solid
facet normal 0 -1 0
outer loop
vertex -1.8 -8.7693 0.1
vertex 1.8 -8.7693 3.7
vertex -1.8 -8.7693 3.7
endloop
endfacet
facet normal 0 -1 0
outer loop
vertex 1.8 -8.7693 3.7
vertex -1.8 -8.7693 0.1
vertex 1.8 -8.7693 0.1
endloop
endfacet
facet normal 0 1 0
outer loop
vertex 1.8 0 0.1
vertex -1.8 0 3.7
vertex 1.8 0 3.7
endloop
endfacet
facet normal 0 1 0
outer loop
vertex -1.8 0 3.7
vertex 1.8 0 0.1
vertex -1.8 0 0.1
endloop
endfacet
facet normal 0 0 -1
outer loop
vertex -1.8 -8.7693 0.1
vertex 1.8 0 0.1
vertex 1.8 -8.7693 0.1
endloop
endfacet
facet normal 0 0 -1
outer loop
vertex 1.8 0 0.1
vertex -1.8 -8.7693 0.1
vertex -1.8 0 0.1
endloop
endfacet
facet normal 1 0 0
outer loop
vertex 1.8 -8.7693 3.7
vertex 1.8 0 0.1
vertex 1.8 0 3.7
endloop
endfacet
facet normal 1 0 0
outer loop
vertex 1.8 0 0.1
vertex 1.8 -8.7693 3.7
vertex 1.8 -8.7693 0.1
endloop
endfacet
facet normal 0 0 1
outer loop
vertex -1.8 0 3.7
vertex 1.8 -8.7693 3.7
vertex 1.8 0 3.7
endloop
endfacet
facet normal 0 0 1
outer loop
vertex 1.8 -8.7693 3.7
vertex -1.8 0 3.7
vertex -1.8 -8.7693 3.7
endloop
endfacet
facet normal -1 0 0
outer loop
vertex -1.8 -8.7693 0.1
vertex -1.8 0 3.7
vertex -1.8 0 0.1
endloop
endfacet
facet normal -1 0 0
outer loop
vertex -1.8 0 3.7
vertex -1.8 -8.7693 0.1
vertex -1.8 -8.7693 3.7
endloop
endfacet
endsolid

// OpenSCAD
////////////////////////////////////////////////////////////////////////////////
//
// FingerBoard.scad
//
// Contains OpenScad code for the fingerboard/neck for the guitar chord chart
// project.
//
// Copyright (C) 2015-2016 Joseph M. Corbett
//
// This program is free software: you can redistribute it and/or modify it under
// the terms of the GNU General Public License as published by the Free Software
// Foundation, either version 3 of the License, or (at your option) any later
// version.
//
// This program is distributed in the hope that it will be useful, but
// WITHOUT ANY WARRANTY; without even the implied warranty of MERCHANTABILITY or
// FITNESS FOR A PARTICULAR PURPOSE. See the GNU General Public License for more
// details.
//
// You should have received a copy of the GNU General Public License along with
// this program. If not, see <http://www.gnu.org/licenses>.
//
////////////////////////////////////////////////////////////////////////////////

include <ChordChartParameters.scad>     // For part parameters.

// Local constants
HoleTolerance           = 0.2;                  // Amount to enlarge holes.
PrinterTolerance        = 0.2;                  // Amount to enlarge hole diameters
                                                //    due to printing tolerance.
MatingOffset            = [4, 0, 0];            // Offset from fret to mating blocks.

// A single fret.
module fret(tolerance = 0)
{
    base = 1.5 + tolerance;
    riserWidth = 0.75 + tolerance;
    riserHeight = 2 + tolerance;
    // The rounded top part of the fret
	cube([base, FBWidth + 2 * tolerance, base], center = true);
    // The squared off lower part of the fret.
    translate([0, 0, riserHeight / 2]) 
        cube([riserWidth, FBWidth + 2 * tolerance, riserHeight], center = true);
    translate([0, -(FBWidth + 2 * tolerance) / 2, riserHeight]) rotate (X * -90)
        cylinder(d = riserWidth, h = FBWidth + 2 * tolerance);


    // // The rounded top part of the fret
	// rotate(X * -90) cylinder(r = FretHeight, h = FBWidth + 2 * tolerance);
    // // The squared off lower part of the fret.
    // translate([-FretHeight, 0, -FretHeight]) 
        // cube([FretHeight * 2, FBWidth + 2 * tolerance, FretHeight]);
}

// All frets.
module frets(tolerance = 0)
{
	for (i = [1:len(FretOffsets) - 1])
	{
		translate([FretOffsets[i], (FBWidth + tolerance) / 2, FBThickness - 1.5]) fret(tolerance);
	}
}

// A single LED hole.
module LedHoles()
{
    if (UseLedHoles)
    {
        for (i = [1:len(FretOffsets) - 1], j = [1:NumStrings])
        {
            // Add a hole for the dome of the LED.
            translate([FretOffsets[i - 1] + (FretOffsets[i] - FretOffsets[i - 1]) / 2,
                      j * (FBWidth / (NumStrings + 1)),
                      -1])
                cylinder(d = LedDiameter + HoleTolerance, h = FBThickness + 2);
            // Add space for the ring at the base of the LED.
            translate([FretOffsets[i - 1] + (FretOffsets[i] - FretOffsets[i - 1]) / 2,
                       j * (FBWidth / (NumStrings + 1)),
                      0]) 
                cylinder(d = LedDiameter + 2 + HoleTolerance, 
                         h = FBThickness - LedHeight + 1);
        }
    }
}

// A mating post.
module MatingPost(tolerance = 0)
{
    side = MatingPinDiameter - tolerance;
    translate([-side / 2, -side / 2, 0])
    cube([side, side , FBMatingHoleDepth + NeckBackMatingHoleDepth - 6]);
}

// All the mating posts.
module MatingPosts()
{
    for(i = FretOffsets)
    {
        // Add a mating post to both sides of the neck at each of the frets.
        translate([i + MatingSupportWidth / 2, 
                   NeckBackThickness + MatingSupportWidth / 2, 
                   -NeckBackMatingHoleDepth - PrinterTolerance] + MatingOffset)
            MatingPost();
        translate([i + MatingSupportWidth / 2, 
                   FBWidth - NeckBackThickness - MatingSupportWidth / 2,
                   -NeckBackMatingHoleDepth - PrinterTolerance] + MatingOffset)
            MatingPost();
    }
}

// The rounded back of the neck.
module NeckBack()
{
	Depth           = FBWidth * NeckZScale / 2;
    TestCubeLength  = 100;
    SphereXScale    = 1.5;
	ExtensionLength = 68;
    
	difference()
	{
        // Create the outer part of the cylinder shell.
		translate([0, FBWidth/2, 0]) rotate(Y * 90) 
            scale([NeckZScale, 1, 1]) cylinder(d = FBWidth, h = NeckLength);
        // Remove the inner part of the cylinder shell.
		translate([-1, FBWidth / 2, 0]) rotate(Y * 90) scale([NeckZScale, 1, 1])
            cylinder(d = FBWidth - (NeckBackThickness * 2), h = NeckLength + 2);
        // Remove the top half of the cylinder.
		translate([-1, -1, 0]) 
            cube([NeckLength + 2, FBWidth + 2, FBWidth * NeckZScale / 2 + 1]);
        // Clip off the small piece that was left due to the headstock merge.
        if (UseStraightNeck == 0)
        {
            // Limit the sphere shell to where it meets the headstock.
            translate([-TestCubeLength * cos(HeadstockYAngle) + 1,
                       -0.1,
                       -TestCubeLength * sin(HeadstockYAngle)])
                rotate([0, -HeadstockYAngle + 0.1, 0])
                cube([TestCubeLength + 10, FBWidth + 0.2, HeadThickness * 2]);
        }
        // Hole for the retainer pin.
        translate([NeckLength - NeckSupportPinHeight, FBWidth / 2, -20]) 
            cylinder(r = NeckSupportPinRadius + 0.1, h = 10);
	}
	difference()
	{
        // Add the mating supports.
		for (i = [0:len(FretOffsets) - 1])
		{
			translate([FretOffsets[i], NeckBackThickness, -Depth] + MatingOffset) 
                cube([MatingSupportWidth, MatingSupportWidth, Depth]);
			translate([FretOffsets[i], FBWidth - NeckBackThickness - MatingSupportWidth,
                      -Depth] + MatingOffset)
                cube([MatingSupportWidth, MatingSupportWidth, Depth]);
		}
        // Lop off the mating supports outside the neck back shell.
		difference()
		{
			translate([-1, FBWidth / 2, 0]) rotate(Y * 90) 
                scale([NeckZScale, 1, 1]) 
                cylinder(d = FBWidth * 2, h = NeckLength + 2);
			translate([0, FBWidth / 2, 0]) rotate(Y * 90) 
                scale([NeckZScale, 1, 1])
                cylinder(d = FBWidth, h = NeckLength);
			translate([-1, -FBWidth / 2, 0]) 
                cube([NeckLength + 2, 
                      FBWidth * 2 + 2,
                      FBWidth * NeckZScale / 2 + 1]);
        }
        // Bore out the holes for the mating connectors.
        for (i = [0:len(FretOffsets) - 1])
        {
            translate([FretOffsets[i] + MatingSupportWidth / 2, 
                       NeckBackThickness + MatingSupportWidth / 2,
                      -NeckBackMatingHoleDepth / 2 - 2] + MatingOffset)
                      MatingPost();
            translate([FretOffsets[i] + MatingSupportWidth / 2,
                       FBWidth - NeckBackThickness-MatingSupportWidth / 2,
                       -NeckBackMatingHoleDepth / 2 - 2] + MatingOffset)
                      MatingPost();
        }
	}
    if(UseStraightNeck)
    {
        // Straight neck merge to the headstock is selected.
        difference()
        {
            // Extend the neck back shell toward the headstock.
            translate([-ExtensionLength, FBWidth / 2, 0]) rotate([0, 90, 0])
                scale([NeckZScale, 1, 1])
                cylinder(d = FBWidth, h = ExtensionLength + 1);
            translate([-ExtensionLength- 0.1, FBWidth / 2, 0])
                rotate([0, 90, 0]) scale([NeckZScale, 1, 1])
                cylinder(d = FBWidth - (NeckBackThickness * 2), h = ExtensionLength + 1.2);
            // Remove the top of the extension cylinders.
            translate([-ExtensionLength - 0.1, -1, 0])
                cube([100 + 2, FBWidth + 2, FBWidth * NeckZScale / 2 + 1]);  
            // Limit the shell to where it meets the headstock.
            translate([-TestCubeLength * cos(HeadstockYAngle),
                       -.01,
                       -TestCubeLength * sin(HeadstockYAngle)])
                rotate([0, -HeadstockYAngle, 0]) 
                cube([TestCubeLength, FBWidth + 0.2, HeadThickness * 2]);
        }
    }
    else
    {
        // Spherical neck merge to the headstock is selected.
        difference()
        {
            // Create a scaled sphere to extend the neck back toward the headstock.
            translate([1, FBWidth / 2, 0]) 
                scale([SphereXScale, 1, NeckZScale]) 
                sphere(d = FBWidth);
            // Truncate the sphere at the point of intersection with the neck back.
            translate([1, FBWidth / 2, 0]) rotate(Y * 90) 
                scale([NeckZScale, 1, 1]) 
                cylinder(d = FBWidth - (NeckBackThickness * 2), h = FBWidth + 1);
            // Limit the sphere to be a shell with the same thickness as the neck back.
            translate([1, FBWidth / 2, 0])
                scale([SphereXScale, 1, NeckZScale])
                sphere(d = FBWidth - (NeckBackThickness * 2));
            // Cut off the top of the sphere shell.
            translate([-ExtensionLength - 0.1, -1, 0])
                cube([100 + 2, FBWidth + 2, FBWidth * NeckZScale / 2 + 1]); 
            // Limit the sphere shell to where it meets the headstock.
            translate([-TestCubeLength * cos(HeadstockYAngle) + 1,
                       -0.1,
                       -TestCubeLength * sin(HeadstockYAngle)])
                rotate([0, -HeadstockYAngle + 0.1, 0])
                cube([TestCubeLength + 10, FBWidth + 0.2, HeadThickness * 2]);
        }
    }
}

// Holes in the bottom of the fingerboard used for mating the fingerboard to the back of the neck.
module MatingHoles(depth = 1)
{
	for (i = [0:len(FretOffsets) - 1])
	{
		translate([FretOffsets[i] + MatingSupportWidth / 2, 
                   NeckBackThickness + MatingSupportWidth / 2, 
                   -0.2] + MatingOffset)
                   MatingPost();
		translate([FretOffsets[i] + MatingSupportWidth / 2,
                   FBWidth - NeckBackThickness - MatingSupportWidth / 2,
                   -0.2] + MatingOffset)
                   MatingPost();
	}	
}

// A single decorative inlay in the top of the fingerboard.
module TopInlay(FretIndex, tolerance = 0)
{
    if (UseTopInlays)
    {
        margin = 3;
        base   = FretOffsets[FretIndex - 1];
        height = FretOffsets[FretIndex] - base - 2 * margin;
        width  = FBWidth - 2 * margin;

        difference()
        {
            // Start the inlay with a square centered within the fret box.
            translate([base + margin + 0.1, margin, FBThickness - 1.9])
                cube([height + tolerance, width + tolerance, 2]);
            if (UseTriangularTopInlays)
            {
                // Turn the inlay into a triangle by removing half of the square diagonally.
                translate([base + margin + 0.1, margin, FBThickness - 2])
                    rotate([0, 0, atan2(width, height)-10])
                    cube([height * 5, width * 5, 2.2]);
            }
            // Cut the LID holes into the inlays.
            if (UseLedHoles)
            {
                for (i = [1:NumStrings])
                {
                    translate([base + height / 2 + margin,
                               i * (FBWidth / (NumStrings + 1)),
                               FBThickness - 2])
                        cylinder(d = LedDiameter + HoleTolerance, h = 3);
                }
            }
        }
    }
}

// A single decorative inlay in the side of the fingerboard.
module SideInlay(FretIndex, tolerance = 0)
{
    if (UseSideInlays)
    {
        margin      = 2;
        inlayHeight = FBThickness - 2 * margin;
        inlayWidth  = inlayHeight;
        baseX       = (FretOffsets[FretIndex] + FretOffsets[FretIndex - 1] - inlayWidth) / 2;
        baseZ       = margin;

        if (UseSquareSideInlays)
        {
            // Side inlays should be square.
            translate([baseX, -0.1, baseZ]) 
                cube([inlayWidth + tolerance, 2, inlayHeight + tolerance]);
        }
        else
        {
            // Side inlays should be circular.
            translate([baseX + (inlayWidth + tolerance) / 2, 1.9, baseZ + (inlayWidth + tolerance) / 2]) 
                rotate([90, 0, 0])
                cylinder(d = inlayWidth + tolerance, h = 2);
        }
    }
}

// The fingerboard itself containing frets, LED holes, and inlays.
module FingerBoard()
{
    difference()
    {
        // Start with the basic fingerboard shape.
        cube([NeckLength, FBWidth, FBThickness]);
        // Add the fret slots.
        frets(.3);
        // Add the LED holes.
        LedHoles();
        // Add the mounting holes.
        translate([0, 0, -3])
            MatingHoles(FBMatingHoleDepth + HoleTolerance);
        // Add the inlay insets.
        for(i = InlayFrets)
        {
            TopInlay(i, HoleTolerance);
            SideInlay(i, HoleTolerance);
        }
        // Cut out space for the nut.
        translate([-PrinterTolerance, -1, 2]) 
            cube([NutWidth + PrinterTolerance, FBWidth + 2, NutHeight]);
        // Add the mounting holes for the nut.
        translate([-PrinterTolerance, 0, 2]) Nut(HoleTolerance);
    }
}

// Fingerboard inlays on specific frets only.
module TopInlays()
{
    for(i=InlayFrets)
    {
        TopInlay(i, 0);
    }
}

// Fingerboard side inlays on specific frets only.
module SideInlays()
{
    for(i = InlayFrets)
    {
        SideInlay(i, 0);
    }
}


// color(FBColor) FingerBoard();

// color(NeckBackColor) translate(-1 * ExplodeZOffset * Explode) NeckBack();
// color(InlayColor)    translate(ExplodeZOffset*Explode) TopInlays();
// color(InlayColor)    translate(-1 * ExplodeYOffset * Explode) SideInlays();
// color(FretColor)     translate(ExplodeZOffset * Explode) frets(0);
// color(NutColor)      translate([0, 0, 2] + ExplodeZOffset * Explode) Nut(0);
// color(NeckBackColor) translate(-0.4 * ExplodeZOffset * Explode) MatingPosts();

//==============================================================================
// The following modules are used for making test prints of various portions
// of the finger board.
//==============================================================================

// Test the lower part of the fingerboard that goes into the base's neck mount.
module TestFbBase()
{
    length = FretOffsets[FretOffsetSize - 1] -
             FretOffsets[FretOffsetSize - 2] + NeckExtension + 4;
    translate([FBWidth / 2, -FretOffsets[FretOffsetSize - 1], 0]) rotate([0, 0, 90])
        intersection()
        {
            FingerBoard();
            translate([FretOffsets[FretOffsetSize - 2] - 2, 0, 0])
                cube([length, FBWidth + 2, FBThickness + 2]);
        }
}

// Test the lower part of the neck that goes into the base's neck mount.
module TestNeckBackBase()
{
    length = FretOffsets[FretOffsetSize - 1] -
             FretOffsets[FretOffsetSize - 2] + NeckExtension + 4;
    translate([-FBWidth / 2, -FretOffsets[FretOffsetSize - 1], 0]) rotate([180, 0, 90])
        intersection()
        {
            NeckBack();
            translate([FretOffsets[FretOffsetSize - 2] - 2, 0, -25])
                cube([length, FBWidth + 2, 30]);
        }
}

// Test the upper part of the fingerboard that connects to the head.
module TestFbTop()
{
    length = FretOffsets[1] + 15;
    translate([FBWidth / 2, -FretOffsets[1] / 2, 0]) rotate([0, 0, 90])
        intersection()
        {
            FingerBoard();
            translate([-1, 0, 0])
                cube([length, FBWidth + 2, FBThickness + 2]);
        }
}

// Test the upper part of the neck that connects to the head.
module TestNeckBackTop()
{
    length = FretOffsets[1] + 55;
    translate([-FBWidth / 2, -FretOffsets[1] / 2, 0]) rotate([180, 0, 90])
        intersection()
        {
            NeckBack();
            translate([-FretOffsets[1], 0, -25])
                cube([length, FBWidth + 2, 30]);
        }
}

// Print a specified top inlay oriented for printing.
module PrintTopInlay(fretIndex = 0, tol = 0)
{
    translate([-FretOffsets[InlayFrets[fretIndex]], FBWidth / 2, FBThickness + 0.1])
        rotate([180, 0, 0]) TopInlay(InlayFrets[fretIndex], tol);
}

// Print a side inlay oriented for printing.
module PrintSideInlay(fretIndex = 0, tol = 0)
{
    translate([-FretOffsets[InlayFrets[fretIndex]], 0, 2])
        rotate([-90, 0, 0]) SideInlay(InlayFrets[fretIndex], tol);
}

// Print the entire neck back oriented for printing.
module PrintNeckBack()
{
    rotate([0, 0, 90]) 
        translate([-NeckLength / 2, FBWidth / 2, 0]) rotate([180, 0, 0]) 
        NeckBack();
}

// Print the lower portion of the neck back that contains the retainer pin hole
// as a test.
module TestNeckBackHole()
{
    translate([-(NeckLength - NeckSupportHeight) / 2, 0, 0])
        intersection()
        {
            PrintNeckBack();
            translate([(NeckLength - NeckSupportHeight) / 2 + 1, 0, 0]) 
                cube([NeckSupportHeight + 4, FBWidth + 1, FBWidth + 1], center = true);
        }
}

module PrintNut()
{
    translate([0, 0, NutHeight]) rotate([180, 0, 0]) Nut(0);
}

module PrintMatingPost()
{
    translate([0, 0, (MatingPinDiameter - 0.2) / 2]) rotate([90, 0, 0]) MatingPost(0.4);
}


// TestNeckBackHole();
// TestFbBase();
// TestNeckBackBase();
// rotate([-90, 0, 0]) SideInlay(0, 0);
// TestFbTop();
// TestNeckBackTop(); // Export as .off file
// translate([0, 0, NutHeight]) rotate([180, 0, 0]) Nut(0);


// FingerBoard();
// PrintNeckBack(); // Export as .off file
// PrintNut();
// fret();
PrintMatingPost();
// PrintTopInlay(0, 0);
// PrintTopInlay(1, 0);
// PrintSideInlay(3, 0);
// PrintSideInlay(5, 0);
